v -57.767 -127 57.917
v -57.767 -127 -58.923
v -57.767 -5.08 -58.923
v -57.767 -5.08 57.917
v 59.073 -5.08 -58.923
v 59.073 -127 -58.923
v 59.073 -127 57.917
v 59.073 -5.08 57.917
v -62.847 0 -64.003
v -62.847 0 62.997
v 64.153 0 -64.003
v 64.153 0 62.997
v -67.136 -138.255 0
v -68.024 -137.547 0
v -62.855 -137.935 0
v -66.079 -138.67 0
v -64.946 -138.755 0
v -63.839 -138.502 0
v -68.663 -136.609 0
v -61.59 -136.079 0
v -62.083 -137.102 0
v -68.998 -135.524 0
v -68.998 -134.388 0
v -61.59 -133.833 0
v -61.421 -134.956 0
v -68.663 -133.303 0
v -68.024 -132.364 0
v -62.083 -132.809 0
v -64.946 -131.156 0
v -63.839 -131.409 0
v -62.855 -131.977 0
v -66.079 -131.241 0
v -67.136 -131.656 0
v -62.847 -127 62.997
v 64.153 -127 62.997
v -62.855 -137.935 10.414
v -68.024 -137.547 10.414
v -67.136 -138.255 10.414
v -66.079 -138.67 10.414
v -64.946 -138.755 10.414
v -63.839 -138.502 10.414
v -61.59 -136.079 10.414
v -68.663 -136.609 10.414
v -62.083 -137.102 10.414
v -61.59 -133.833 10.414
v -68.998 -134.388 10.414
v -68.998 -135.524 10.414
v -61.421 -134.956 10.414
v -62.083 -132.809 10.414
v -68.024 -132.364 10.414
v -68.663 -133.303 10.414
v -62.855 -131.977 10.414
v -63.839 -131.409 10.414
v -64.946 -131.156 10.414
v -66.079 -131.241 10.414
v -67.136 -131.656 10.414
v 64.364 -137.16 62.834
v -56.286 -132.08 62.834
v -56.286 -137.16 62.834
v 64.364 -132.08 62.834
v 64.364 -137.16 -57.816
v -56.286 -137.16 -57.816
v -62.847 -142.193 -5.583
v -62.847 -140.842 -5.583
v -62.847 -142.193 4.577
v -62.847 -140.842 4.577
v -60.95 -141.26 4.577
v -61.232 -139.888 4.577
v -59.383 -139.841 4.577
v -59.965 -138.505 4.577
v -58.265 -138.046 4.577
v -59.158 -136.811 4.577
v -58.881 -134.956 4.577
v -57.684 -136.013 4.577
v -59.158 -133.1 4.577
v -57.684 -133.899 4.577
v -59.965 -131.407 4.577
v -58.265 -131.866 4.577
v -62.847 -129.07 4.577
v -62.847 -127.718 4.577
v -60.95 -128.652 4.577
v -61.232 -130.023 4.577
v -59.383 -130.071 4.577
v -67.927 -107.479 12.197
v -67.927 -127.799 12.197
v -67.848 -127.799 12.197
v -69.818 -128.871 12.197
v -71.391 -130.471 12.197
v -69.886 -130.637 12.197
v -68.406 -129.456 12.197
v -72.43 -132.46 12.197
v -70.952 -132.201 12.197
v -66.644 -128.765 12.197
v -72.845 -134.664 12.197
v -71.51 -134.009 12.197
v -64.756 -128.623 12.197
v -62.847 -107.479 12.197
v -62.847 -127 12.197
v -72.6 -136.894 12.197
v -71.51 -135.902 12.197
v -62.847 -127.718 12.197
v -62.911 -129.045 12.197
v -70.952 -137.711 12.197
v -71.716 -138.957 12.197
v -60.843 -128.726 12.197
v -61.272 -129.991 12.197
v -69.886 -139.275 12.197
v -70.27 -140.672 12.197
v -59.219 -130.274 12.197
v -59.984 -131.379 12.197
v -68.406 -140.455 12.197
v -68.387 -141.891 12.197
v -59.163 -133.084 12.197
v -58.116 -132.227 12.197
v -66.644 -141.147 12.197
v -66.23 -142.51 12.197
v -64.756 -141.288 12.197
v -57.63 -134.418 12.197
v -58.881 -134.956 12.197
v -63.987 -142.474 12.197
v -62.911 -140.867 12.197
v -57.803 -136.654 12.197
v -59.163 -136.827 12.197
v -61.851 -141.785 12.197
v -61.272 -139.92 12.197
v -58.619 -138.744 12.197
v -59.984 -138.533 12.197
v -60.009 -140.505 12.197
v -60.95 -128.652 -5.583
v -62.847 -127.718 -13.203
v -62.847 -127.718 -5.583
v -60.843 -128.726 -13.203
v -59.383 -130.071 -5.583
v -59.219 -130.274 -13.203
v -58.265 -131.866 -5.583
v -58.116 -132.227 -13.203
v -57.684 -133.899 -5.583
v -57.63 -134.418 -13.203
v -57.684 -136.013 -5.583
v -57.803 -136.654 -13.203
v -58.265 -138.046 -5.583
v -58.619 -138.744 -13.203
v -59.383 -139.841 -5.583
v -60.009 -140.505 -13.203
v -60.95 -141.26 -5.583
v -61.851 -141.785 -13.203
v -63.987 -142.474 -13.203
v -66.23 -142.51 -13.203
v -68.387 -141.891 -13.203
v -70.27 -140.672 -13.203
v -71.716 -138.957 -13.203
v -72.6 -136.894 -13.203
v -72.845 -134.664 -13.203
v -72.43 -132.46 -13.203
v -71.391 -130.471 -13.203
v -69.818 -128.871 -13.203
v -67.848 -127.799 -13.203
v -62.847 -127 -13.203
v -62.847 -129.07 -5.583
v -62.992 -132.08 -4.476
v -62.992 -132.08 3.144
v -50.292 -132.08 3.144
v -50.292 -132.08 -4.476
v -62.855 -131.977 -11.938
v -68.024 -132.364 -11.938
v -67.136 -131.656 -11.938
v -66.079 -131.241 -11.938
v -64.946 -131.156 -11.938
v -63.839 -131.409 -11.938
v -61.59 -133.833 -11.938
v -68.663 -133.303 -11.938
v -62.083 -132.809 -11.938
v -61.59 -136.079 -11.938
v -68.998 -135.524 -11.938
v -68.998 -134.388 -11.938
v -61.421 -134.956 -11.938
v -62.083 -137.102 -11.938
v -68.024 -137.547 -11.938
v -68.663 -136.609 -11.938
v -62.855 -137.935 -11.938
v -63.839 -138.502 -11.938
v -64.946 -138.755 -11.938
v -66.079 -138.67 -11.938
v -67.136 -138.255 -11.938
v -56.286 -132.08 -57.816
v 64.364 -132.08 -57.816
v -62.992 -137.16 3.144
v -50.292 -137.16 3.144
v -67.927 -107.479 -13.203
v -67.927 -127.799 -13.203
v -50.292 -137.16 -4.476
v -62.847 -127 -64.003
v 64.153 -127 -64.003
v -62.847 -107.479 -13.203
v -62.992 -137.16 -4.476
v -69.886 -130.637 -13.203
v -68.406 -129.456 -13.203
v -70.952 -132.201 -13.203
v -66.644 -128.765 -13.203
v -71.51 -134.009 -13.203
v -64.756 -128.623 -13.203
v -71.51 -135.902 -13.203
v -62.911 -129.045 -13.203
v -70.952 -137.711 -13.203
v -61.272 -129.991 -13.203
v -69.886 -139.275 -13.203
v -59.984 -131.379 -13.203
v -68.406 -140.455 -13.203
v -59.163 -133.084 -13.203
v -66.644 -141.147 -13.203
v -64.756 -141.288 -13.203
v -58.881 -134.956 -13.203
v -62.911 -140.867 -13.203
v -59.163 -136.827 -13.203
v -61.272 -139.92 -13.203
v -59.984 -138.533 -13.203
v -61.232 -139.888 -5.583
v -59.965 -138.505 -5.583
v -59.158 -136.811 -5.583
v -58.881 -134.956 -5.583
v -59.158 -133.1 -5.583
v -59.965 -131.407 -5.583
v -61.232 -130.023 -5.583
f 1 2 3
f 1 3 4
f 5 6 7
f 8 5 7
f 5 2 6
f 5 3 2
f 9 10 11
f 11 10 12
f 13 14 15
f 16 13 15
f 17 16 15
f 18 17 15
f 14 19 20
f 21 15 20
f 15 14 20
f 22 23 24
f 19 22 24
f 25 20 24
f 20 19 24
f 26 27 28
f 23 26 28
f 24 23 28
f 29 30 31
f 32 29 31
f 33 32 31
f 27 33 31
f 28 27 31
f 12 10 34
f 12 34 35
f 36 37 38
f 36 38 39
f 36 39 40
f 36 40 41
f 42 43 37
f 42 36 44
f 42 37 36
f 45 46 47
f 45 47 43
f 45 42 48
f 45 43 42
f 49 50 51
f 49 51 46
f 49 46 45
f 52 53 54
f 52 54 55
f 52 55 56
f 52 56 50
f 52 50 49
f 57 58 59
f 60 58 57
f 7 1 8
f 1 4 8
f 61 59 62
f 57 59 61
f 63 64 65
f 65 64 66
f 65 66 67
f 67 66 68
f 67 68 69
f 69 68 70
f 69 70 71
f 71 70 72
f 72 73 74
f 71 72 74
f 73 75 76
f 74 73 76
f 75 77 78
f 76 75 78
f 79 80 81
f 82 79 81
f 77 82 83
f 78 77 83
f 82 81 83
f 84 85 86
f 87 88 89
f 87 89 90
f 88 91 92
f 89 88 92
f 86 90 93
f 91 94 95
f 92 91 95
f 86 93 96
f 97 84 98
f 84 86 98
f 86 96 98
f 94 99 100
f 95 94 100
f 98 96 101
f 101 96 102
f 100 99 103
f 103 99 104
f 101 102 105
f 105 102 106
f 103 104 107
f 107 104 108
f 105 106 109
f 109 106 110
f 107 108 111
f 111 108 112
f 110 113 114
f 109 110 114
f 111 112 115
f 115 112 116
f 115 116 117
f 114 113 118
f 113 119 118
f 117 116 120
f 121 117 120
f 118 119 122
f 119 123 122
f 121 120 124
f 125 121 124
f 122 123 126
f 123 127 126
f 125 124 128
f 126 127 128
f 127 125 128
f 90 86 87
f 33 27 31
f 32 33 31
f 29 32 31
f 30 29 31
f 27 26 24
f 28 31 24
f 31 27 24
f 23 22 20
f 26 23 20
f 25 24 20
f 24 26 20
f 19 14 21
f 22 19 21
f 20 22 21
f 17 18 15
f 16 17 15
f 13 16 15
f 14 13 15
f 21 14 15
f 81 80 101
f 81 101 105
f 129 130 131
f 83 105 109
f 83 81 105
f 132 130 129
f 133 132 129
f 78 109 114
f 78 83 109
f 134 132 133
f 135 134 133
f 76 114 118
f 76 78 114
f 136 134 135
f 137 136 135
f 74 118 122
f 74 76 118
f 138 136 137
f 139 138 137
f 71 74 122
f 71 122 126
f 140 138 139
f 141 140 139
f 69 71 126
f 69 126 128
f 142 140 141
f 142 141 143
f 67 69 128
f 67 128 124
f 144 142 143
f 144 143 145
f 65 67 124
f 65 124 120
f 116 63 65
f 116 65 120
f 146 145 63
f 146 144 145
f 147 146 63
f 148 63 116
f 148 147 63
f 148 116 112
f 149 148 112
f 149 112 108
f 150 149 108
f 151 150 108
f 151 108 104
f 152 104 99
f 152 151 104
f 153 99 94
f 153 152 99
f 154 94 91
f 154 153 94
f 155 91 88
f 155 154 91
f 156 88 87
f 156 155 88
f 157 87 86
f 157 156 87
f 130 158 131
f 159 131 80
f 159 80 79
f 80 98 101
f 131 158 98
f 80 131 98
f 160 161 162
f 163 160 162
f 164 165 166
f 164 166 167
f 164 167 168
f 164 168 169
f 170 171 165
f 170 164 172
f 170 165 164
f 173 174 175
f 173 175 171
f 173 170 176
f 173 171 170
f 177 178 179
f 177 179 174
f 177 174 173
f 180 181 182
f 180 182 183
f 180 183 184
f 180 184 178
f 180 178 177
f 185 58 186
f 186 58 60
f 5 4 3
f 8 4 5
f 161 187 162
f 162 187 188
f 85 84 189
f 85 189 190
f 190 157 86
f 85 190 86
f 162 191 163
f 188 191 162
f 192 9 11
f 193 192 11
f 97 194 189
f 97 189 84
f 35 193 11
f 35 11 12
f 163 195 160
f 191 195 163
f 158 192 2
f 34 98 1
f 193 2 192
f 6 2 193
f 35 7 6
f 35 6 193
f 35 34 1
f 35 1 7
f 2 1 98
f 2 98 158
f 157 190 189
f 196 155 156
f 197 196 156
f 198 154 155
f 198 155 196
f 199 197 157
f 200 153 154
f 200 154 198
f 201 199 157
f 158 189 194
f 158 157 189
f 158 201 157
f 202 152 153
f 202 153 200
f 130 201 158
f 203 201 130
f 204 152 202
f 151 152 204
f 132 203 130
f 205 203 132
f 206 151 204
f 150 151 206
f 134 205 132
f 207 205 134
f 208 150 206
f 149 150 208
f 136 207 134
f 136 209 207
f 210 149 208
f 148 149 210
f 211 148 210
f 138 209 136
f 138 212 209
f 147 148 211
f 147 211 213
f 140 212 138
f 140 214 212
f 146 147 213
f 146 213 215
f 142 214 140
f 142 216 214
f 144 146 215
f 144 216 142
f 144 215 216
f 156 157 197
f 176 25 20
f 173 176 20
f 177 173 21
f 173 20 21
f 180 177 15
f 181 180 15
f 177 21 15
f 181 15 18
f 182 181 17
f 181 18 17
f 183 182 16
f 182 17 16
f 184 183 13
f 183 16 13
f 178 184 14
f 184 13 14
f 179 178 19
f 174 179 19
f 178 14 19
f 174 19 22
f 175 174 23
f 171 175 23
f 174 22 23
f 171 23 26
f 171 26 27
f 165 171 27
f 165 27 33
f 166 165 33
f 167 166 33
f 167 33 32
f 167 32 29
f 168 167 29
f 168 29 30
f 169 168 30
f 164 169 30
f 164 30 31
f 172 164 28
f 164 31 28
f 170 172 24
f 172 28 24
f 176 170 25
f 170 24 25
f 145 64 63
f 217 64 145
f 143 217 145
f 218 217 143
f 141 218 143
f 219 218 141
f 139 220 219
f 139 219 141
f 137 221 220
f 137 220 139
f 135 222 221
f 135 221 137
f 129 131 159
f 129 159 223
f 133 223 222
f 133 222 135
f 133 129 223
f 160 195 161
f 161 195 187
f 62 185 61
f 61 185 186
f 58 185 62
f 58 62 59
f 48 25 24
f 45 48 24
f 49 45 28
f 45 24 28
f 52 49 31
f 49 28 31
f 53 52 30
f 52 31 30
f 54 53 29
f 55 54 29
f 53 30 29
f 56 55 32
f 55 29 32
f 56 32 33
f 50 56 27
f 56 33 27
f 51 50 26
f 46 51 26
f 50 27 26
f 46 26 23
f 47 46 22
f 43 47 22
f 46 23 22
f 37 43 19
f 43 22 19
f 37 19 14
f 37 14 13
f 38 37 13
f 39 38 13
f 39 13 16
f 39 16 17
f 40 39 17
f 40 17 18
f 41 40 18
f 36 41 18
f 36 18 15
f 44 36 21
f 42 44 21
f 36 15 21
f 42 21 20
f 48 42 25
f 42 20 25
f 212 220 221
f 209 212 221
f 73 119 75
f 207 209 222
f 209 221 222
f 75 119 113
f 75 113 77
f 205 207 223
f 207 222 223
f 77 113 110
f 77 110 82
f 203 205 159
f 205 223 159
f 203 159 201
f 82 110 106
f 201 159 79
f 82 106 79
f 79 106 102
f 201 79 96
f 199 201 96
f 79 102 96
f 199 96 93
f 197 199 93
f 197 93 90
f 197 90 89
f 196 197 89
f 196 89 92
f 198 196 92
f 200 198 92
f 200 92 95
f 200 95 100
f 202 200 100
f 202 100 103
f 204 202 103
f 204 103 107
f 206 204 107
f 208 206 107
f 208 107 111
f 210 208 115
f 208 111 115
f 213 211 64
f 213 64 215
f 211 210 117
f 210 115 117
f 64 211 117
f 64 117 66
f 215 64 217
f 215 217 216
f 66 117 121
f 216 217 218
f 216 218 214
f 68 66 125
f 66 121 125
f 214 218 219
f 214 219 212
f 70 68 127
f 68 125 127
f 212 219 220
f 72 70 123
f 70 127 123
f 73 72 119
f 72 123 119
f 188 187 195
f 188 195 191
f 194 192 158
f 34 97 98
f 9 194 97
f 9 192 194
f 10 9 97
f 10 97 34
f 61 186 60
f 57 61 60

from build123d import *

# Parameters (mm, degrees)
F0_W      = 127
F0_H      = 127
F1_DEPTH  = 127
F2_T      = -5.08
F3_W      = 20.32
F3_H      = 25.4
F4_DEPTH  = 5.08
F5_R      = 7.62
F6_DEPTH  = 25.4
F7_R      = 6.35
F8_DEPTH  = 65.024
F9_W      = 7.62
F9_H      = 10.16
F10_DEPTH = 30.226
F11_R     = 3.81
F12_DEPTH = 10.414
F15_W     = 120.65
F15_H     = 120.65
F16_DEPTH = 5.08
F17_W     = 12.7
F17_H     = 7.62
F18_DEPTH = 5.08
F19_R     = 3.81
F20_DEPTH = 11.938


with BuildPart() as f1:
    # F0 (on Front) → F1 (new body)
    with BuildSketch(Plane.XZ):
        with Locations((0.6525404751, -0.5031868781)):
            Rectangle(F0_W, F0_H)
    extrude(amount=F1_DEPTH)

    # F2
    f2_openings = [f1.faces().sort_by_distance(p)[0] for p in [
        (0.65254, -127, -0.503187),
    ]]
    offset(amount=F2_T, openings=f2_openings)

    # F3 (on face) → F4 (join)
    with BuildSketch(Plane(origin=(-62.8474595249, 0, 0), x_dir=(0, -1, 0), z_dir=(-1, 0, 0))):
        with Locations((117.6391393873, -0.5031868781)):
            Rectangle(F3_W, F3_H)
    extrude(amount=F4_DEPTH)

    # F5 (on face) → F6 (join)
    with BuildSketch(Plane(origin=(0, 0, -13.2031868781), x_dir=(1, 0, 0), z_dir=(0, 0, -1))):
        with Locations((-65.2307569981, 134.9557340145)):
            Circle(F5_R)
    extrude(amount=-F6_DEPTH)

    # F7 (on face) → F8 (cut)
    with BuildSketch(Plane.XY.offset(12.1968131219)):
        with Locations((-65.2307569981, -134.9557340145)):
            Circle(F7_R)
    extrude(amount=-F8_DEPTH, mode=Mode.SUBTRACT)

    # F9 (on face) → F10 (cut)
    with BuildSketch(Plane.XZ.offset(127)):
        with Locations((-59.0374595249, -0.5031868781)):
            Rectangle(F9_W, F9_H)
    extrude(amount=F10_DEPTH, mode=Mode.SUBTRACT)


with BuildPart() as f12:
    # F11 (on Top) → F12 (new body)
    with BuildSketch(Plane.XY):
        with Locations((-65.2307569981, -134.9557340145)):
            Circle(F11_R)
    extrude(amount=F12_DEPTH)


with BuildPart() as f16:
    # F15 (on offset) → F16 (new body)
    with BuildSketch(Plane.XZ.offset(132.08)):
        with Locations((4.0387048304, 2.5092192822)):
            Rectangle(F15_W, F15_H)
    extrude(amount=F16_DEPTH)


with BuildPart() as f18:
    # F17 (on face) → F18 (new body)
    with BuildSketch(Plane.XZ.offset(137.16)):
        with Locations((-56.6423790693, -0.6657807178)):
            Rectangle(F17_W, F17_H)
    extrude(amount=-F18_DEPTH)


with BuildPart() as f20:
    # F19 (on offset) → F20 (new body)
    with BuildSketch(Plane(origin=(0, 0, 0), x_dir=(1, 0, 0), z_dir=(0, 0, -1))):
        with Locations((-65.2307569981, 134.9557340145)):
            Circle(F19_R)
    extrude(amount=F20_DEPTH)


solid = Compound([f1.part, f12.part, f16.part, f18.part, f20.part])
